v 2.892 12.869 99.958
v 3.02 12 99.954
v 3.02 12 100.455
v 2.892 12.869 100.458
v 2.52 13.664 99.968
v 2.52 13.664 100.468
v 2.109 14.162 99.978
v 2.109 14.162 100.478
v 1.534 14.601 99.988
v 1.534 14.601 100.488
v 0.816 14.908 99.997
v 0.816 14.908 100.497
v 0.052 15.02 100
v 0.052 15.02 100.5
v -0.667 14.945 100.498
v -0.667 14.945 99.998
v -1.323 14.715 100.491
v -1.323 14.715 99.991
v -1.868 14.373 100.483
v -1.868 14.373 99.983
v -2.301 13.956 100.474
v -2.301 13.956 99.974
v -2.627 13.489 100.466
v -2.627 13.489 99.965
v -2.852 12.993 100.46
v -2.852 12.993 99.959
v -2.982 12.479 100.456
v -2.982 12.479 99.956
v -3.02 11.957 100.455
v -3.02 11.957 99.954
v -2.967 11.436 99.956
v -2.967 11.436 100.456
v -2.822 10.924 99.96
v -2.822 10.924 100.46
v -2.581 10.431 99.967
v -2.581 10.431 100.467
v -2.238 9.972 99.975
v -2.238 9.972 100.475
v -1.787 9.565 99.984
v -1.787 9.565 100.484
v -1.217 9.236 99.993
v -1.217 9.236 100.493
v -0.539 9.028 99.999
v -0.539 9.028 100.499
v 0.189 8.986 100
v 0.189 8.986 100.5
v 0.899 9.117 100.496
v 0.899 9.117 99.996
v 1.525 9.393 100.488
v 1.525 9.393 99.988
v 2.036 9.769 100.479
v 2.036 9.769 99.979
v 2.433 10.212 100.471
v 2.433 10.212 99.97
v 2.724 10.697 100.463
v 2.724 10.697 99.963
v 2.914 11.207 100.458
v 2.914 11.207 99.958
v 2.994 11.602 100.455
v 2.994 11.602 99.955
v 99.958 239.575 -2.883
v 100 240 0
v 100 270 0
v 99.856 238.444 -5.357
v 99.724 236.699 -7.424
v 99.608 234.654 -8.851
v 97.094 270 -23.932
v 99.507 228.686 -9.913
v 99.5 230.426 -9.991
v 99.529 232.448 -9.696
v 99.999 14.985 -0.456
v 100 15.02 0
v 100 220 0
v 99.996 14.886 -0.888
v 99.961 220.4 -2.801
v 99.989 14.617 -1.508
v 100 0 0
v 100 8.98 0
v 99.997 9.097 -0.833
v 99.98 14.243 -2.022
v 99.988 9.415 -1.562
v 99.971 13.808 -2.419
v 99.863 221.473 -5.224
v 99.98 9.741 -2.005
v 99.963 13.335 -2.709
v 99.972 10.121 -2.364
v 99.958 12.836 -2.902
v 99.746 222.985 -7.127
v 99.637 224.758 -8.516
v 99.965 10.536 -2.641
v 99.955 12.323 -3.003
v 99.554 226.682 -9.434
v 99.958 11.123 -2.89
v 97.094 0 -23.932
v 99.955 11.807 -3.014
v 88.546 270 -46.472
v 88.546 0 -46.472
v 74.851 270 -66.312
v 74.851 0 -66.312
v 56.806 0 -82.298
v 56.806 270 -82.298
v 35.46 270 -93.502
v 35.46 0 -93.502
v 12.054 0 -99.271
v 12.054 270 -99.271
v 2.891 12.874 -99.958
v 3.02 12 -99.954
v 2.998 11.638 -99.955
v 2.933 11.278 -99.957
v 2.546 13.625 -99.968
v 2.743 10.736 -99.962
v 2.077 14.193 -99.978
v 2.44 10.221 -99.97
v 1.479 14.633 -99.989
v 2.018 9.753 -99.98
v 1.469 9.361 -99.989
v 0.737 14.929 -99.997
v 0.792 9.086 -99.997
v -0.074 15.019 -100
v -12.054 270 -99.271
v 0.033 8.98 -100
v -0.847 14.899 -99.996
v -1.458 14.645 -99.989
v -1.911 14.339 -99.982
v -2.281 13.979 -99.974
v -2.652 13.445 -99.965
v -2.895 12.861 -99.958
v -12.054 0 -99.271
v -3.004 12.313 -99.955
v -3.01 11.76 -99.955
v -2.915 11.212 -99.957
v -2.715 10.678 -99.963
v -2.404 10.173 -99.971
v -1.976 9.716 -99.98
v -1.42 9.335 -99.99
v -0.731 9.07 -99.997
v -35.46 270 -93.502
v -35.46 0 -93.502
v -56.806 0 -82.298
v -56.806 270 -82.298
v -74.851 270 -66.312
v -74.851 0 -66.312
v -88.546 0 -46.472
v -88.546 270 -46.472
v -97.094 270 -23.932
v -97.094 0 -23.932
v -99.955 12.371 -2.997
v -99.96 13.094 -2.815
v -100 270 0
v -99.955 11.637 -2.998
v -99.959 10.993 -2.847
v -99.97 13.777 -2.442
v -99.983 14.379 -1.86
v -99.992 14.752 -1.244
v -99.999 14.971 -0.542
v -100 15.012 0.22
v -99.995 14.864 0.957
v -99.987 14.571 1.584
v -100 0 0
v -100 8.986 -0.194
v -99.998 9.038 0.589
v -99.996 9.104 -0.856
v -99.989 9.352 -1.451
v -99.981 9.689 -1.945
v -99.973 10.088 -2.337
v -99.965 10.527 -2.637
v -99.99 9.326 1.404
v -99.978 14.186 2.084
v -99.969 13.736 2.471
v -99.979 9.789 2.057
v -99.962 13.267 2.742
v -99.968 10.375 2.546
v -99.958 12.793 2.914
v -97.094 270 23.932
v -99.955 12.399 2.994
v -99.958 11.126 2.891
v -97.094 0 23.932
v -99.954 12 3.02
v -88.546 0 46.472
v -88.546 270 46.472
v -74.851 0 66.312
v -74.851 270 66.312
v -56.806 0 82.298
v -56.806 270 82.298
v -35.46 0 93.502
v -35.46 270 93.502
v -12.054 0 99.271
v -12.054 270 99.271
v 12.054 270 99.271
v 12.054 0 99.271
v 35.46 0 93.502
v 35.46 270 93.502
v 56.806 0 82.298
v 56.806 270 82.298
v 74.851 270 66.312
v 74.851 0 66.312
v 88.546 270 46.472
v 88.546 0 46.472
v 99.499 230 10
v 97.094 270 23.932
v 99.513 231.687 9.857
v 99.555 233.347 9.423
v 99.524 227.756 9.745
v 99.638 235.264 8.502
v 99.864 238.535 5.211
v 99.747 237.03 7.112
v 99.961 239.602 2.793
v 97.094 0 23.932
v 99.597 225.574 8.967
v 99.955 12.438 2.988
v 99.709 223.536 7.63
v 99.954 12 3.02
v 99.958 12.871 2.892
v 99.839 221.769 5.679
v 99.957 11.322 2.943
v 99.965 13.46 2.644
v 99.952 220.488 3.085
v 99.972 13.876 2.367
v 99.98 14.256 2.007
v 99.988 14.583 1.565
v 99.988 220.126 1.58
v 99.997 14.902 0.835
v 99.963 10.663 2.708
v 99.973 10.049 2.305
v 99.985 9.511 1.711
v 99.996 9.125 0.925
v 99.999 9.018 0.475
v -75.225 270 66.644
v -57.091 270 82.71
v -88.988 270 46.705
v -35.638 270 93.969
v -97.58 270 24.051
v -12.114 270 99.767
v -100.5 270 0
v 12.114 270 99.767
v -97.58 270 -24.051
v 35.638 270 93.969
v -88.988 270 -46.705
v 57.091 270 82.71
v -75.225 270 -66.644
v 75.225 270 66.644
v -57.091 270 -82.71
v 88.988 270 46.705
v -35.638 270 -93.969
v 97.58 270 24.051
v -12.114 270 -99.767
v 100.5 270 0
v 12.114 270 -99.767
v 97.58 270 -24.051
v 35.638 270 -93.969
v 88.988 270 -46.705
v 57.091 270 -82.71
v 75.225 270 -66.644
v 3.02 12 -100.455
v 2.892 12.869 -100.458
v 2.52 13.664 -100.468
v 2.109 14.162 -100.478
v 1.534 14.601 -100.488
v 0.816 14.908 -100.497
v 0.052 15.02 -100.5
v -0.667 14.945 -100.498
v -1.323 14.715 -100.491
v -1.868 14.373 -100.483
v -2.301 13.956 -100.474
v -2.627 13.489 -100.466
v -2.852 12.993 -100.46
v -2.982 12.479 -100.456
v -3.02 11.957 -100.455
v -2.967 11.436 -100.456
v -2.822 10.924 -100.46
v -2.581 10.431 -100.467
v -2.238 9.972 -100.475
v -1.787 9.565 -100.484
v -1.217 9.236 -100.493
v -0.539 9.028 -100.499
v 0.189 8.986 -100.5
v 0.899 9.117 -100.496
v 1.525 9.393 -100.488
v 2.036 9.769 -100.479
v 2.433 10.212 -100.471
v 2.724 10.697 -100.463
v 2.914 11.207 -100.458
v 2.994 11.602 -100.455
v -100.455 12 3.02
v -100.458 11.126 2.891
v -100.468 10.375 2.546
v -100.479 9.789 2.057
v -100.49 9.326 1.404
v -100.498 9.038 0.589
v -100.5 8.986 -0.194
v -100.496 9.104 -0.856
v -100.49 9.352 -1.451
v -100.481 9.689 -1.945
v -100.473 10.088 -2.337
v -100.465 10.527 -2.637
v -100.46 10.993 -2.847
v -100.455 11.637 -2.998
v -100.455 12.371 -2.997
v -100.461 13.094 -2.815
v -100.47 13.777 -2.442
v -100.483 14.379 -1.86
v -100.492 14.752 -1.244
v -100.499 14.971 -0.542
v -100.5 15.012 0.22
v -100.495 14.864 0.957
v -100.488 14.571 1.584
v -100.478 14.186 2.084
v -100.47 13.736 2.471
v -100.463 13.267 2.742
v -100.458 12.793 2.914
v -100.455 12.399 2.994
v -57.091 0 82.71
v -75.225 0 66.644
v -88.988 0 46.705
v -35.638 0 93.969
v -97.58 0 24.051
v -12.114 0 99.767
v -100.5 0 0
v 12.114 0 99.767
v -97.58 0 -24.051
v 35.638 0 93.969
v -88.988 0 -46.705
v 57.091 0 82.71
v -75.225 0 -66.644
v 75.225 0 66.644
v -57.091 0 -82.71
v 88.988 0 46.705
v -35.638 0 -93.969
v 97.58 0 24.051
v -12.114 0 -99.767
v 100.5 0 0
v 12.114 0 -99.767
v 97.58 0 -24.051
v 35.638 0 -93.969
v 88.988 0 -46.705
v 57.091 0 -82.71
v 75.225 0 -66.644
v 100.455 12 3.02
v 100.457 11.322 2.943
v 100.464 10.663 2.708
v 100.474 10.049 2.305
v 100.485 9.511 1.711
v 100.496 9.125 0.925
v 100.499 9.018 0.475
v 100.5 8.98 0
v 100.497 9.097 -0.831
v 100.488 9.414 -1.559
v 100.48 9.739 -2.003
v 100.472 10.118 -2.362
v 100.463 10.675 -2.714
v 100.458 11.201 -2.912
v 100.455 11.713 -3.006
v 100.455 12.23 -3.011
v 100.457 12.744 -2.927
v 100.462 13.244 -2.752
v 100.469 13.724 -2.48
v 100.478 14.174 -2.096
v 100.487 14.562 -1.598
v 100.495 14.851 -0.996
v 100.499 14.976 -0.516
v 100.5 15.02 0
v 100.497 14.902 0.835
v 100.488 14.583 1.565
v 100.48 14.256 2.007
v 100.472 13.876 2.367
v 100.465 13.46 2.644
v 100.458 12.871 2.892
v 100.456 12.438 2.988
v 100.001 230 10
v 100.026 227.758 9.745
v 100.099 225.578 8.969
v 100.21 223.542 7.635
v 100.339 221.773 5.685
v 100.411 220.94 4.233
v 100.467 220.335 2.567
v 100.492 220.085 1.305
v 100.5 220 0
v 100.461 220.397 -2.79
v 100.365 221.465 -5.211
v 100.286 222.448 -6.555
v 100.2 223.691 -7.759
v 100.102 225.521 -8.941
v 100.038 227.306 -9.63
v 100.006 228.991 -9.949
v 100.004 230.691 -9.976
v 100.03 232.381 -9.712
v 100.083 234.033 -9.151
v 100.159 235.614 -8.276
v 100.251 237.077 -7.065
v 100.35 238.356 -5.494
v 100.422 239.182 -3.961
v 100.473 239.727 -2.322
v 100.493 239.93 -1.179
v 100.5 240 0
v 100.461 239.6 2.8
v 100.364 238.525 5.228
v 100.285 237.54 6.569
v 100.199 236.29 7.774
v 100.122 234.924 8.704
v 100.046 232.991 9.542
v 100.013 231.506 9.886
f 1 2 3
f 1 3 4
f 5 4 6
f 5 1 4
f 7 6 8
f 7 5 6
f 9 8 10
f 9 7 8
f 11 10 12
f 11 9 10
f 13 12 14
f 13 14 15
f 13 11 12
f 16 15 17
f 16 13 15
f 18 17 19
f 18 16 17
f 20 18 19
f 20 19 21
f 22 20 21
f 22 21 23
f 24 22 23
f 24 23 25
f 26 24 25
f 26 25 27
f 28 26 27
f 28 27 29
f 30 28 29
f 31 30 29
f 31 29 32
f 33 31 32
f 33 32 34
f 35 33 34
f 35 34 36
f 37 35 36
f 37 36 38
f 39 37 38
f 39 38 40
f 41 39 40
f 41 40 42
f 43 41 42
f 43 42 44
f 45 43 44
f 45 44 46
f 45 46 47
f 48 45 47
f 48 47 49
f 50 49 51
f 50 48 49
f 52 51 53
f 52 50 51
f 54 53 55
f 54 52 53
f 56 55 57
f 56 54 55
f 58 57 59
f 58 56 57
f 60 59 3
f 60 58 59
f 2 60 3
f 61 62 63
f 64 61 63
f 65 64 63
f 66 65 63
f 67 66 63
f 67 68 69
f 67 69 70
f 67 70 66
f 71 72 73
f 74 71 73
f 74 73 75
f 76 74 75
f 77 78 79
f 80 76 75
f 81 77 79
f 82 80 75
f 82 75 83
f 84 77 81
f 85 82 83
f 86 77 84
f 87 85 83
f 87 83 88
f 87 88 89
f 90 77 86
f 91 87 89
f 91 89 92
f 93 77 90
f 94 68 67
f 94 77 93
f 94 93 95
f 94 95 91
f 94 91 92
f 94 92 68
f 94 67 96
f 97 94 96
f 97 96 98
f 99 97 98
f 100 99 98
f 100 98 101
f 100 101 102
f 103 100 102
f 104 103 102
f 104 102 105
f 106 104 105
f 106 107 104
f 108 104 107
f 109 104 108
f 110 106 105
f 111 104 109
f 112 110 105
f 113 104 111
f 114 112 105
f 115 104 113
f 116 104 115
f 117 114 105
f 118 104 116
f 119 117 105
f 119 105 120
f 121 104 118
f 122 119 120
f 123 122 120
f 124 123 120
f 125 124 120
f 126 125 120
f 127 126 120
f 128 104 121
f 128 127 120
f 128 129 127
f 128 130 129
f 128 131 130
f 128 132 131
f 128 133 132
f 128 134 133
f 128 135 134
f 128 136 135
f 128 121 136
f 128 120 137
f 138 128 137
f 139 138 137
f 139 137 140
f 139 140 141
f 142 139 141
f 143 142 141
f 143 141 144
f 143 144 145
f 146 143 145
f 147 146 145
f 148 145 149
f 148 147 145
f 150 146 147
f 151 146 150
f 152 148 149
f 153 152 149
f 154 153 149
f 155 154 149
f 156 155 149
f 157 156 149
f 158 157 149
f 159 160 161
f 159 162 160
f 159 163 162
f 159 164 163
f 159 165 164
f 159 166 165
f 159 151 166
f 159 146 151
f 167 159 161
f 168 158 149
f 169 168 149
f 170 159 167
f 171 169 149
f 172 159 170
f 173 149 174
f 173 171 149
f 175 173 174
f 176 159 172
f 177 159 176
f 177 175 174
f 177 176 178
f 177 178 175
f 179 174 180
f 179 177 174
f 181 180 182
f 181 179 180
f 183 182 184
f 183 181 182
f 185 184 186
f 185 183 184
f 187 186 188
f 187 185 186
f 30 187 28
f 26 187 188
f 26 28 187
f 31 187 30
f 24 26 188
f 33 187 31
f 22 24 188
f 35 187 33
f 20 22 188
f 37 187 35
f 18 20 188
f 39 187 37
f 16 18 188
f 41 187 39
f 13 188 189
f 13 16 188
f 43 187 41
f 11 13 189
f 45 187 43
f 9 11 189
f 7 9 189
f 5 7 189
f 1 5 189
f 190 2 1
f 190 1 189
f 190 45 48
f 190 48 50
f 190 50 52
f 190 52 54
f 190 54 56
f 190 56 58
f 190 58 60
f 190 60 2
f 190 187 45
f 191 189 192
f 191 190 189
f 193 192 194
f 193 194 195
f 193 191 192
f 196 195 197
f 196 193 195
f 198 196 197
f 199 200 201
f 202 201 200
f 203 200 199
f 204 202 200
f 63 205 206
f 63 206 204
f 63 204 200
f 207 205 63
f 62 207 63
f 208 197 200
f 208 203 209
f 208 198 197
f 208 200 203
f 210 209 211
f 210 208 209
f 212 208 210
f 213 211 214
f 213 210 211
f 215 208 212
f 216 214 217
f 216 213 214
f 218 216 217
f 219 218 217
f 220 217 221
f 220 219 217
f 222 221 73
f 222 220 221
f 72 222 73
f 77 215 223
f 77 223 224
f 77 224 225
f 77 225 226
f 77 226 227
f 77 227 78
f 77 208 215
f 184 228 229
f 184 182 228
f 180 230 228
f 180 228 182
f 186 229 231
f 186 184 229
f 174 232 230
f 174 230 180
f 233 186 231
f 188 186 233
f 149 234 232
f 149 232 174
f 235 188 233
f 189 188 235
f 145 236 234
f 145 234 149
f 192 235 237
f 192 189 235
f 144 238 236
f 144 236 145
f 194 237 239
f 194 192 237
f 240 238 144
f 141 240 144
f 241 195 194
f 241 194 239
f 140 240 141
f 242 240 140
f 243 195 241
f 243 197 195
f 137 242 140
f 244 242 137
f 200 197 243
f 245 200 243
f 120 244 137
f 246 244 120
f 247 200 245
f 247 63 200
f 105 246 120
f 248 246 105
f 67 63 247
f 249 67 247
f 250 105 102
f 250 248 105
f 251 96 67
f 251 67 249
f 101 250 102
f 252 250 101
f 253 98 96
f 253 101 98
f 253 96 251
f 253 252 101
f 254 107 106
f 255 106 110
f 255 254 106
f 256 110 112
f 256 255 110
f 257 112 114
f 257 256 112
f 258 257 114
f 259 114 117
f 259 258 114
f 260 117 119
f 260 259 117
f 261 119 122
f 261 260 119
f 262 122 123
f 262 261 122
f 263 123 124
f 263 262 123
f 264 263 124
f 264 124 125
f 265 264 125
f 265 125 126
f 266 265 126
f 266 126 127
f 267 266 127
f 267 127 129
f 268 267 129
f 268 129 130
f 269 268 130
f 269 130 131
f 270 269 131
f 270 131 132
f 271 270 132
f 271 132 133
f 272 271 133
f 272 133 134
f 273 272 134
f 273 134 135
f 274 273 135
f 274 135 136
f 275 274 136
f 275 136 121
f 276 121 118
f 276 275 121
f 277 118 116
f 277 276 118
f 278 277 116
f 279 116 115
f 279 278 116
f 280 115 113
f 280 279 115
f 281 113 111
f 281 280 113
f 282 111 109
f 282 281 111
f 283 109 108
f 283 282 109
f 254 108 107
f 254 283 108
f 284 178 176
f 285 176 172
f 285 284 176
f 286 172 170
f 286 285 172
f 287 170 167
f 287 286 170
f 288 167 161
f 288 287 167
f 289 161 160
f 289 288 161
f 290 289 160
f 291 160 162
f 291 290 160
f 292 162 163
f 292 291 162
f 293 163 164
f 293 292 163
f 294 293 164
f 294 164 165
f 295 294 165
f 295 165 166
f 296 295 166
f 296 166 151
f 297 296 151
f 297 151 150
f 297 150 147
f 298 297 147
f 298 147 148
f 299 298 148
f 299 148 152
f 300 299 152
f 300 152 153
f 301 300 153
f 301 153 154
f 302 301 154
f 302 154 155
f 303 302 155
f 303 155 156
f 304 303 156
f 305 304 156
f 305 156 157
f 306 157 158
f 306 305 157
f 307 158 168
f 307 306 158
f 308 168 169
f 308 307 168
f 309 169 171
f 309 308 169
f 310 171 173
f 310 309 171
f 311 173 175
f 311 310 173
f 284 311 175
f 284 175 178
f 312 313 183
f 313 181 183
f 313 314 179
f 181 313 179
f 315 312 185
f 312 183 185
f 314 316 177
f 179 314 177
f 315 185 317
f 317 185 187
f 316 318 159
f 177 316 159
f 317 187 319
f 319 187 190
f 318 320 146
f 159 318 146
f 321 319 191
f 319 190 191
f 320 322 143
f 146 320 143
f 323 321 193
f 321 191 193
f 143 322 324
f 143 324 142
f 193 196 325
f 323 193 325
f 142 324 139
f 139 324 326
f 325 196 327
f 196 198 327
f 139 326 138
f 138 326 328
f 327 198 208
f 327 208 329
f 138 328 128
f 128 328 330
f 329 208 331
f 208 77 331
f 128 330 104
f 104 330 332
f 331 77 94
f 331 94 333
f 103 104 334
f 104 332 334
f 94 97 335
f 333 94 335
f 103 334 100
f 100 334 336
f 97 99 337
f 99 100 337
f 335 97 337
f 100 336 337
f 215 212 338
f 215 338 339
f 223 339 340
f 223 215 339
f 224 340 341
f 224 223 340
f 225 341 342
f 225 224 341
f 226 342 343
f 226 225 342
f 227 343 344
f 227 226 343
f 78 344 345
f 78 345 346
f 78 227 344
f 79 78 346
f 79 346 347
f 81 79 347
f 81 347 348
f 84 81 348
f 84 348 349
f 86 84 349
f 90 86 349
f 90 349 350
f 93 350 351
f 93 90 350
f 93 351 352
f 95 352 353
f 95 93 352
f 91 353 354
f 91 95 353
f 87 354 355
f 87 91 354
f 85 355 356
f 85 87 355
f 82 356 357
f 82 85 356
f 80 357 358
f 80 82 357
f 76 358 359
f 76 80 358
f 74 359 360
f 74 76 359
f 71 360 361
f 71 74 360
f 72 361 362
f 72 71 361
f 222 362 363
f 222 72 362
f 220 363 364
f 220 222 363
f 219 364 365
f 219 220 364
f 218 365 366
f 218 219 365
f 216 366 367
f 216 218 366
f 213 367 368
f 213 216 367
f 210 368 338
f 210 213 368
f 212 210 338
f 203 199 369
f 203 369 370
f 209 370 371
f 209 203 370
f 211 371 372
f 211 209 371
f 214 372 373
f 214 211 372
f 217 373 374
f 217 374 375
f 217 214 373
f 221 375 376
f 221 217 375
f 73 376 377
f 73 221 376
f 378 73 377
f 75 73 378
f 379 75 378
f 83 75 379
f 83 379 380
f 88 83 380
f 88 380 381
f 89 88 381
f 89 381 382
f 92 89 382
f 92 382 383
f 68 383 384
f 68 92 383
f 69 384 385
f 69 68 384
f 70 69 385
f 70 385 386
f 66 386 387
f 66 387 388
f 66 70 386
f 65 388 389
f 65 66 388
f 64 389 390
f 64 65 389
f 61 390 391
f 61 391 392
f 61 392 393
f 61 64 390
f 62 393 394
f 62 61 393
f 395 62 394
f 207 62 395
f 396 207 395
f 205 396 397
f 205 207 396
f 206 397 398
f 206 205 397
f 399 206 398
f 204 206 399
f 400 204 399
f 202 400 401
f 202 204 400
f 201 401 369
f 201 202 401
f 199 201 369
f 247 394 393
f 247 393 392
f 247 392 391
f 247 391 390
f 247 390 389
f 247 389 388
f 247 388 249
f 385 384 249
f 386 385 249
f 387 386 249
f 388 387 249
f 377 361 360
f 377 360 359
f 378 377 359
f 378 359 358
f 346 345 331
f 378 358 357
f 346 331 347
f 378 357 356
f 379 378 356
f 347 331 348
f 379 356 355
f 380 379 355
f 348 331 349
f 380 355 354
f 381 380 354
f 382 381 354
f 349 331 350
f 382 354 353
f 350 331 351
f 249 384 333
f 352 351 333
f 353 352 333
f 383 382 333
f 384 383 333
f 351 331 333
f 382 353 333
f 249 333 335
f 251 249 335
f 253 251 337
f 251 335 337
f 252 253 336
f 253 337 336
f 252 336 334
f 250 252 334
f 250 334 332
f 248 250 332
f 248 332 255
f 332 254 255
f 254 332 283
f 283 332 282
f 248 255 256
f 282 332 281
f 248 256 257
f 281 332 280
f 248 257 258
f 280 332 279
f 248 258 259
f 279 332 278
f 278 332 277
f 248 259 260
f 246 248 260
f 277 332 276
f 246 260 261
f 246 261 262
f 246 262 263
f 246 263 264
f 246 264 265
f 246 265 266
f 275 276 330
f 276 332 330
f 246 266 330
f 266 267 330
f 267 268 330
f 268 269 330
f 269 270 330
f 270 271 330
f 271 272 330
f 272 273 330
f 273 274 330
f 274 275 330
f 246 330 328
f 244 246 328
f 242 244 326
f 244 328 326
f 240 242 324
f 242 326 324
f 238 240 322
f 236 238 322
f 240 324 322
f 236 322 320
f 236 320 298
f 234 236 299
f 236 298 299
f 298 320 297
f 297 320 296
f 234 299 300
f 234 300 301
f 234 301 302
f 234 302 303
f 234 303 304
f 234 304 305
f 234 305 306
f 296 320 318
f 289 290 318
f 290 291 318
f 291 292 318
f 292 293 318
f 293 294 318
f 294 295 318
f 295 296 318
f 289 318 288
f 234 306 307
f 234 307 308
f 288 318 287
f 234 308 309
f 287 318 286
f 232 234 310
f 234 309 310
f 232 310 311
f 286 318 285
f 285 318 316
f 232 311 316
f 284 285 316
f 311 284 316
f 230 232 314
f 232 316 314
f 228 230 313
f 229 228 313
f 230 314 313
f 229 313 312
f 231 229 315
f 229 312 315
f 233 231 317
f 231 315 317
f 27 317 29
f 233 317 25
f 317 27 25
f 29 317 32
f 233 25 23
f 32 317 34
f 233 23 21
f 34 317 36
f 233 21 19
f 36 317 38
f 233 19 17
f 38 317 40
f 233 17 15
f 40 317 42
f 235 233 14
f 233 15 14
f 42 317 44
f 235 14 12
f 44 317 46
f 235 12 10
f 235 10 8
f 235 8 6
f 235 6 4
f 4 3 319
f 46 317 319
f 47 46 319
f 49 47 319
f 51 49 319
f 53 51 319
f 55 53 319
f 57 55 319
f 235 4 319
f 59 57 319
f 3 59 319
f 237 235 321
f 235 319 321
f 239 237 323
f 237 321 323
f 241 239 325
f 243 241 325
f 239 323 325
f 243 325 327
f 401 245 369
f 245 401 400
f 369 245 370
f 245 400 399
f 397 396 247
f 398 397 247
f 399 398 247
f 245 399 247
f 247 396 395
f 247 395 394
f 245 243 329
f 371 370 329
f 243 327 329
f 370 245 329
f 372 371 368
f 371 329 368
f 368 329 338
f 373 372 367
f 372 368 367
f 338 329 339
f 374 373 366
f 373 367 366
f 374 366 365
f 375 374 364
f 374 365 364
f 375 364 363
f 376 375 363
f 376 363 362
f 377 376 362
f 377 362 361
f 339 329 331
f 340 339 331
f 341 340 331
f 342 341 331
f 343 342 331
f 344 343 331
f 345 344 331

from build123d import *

# Parameters (mm, degrees)
SKETCH_1_R               = 100.5
SKETCH_1_R_2             = 100
EXTRUDE_1_DEPTH          = 270
CUT_EXTRUDE_1_DEPTH      = 306.123745389
CUT_EXTRUDE_1_DEPTH_BACK = 306.123745389
SKETCH_3_R               = 3.02
CUT_EXTRUDE_2_REACH      = 307.124
CUT_EXTRUDE_2_END_RADIUS = 100.5
SKETCH_3_3_R             = 10
CUT_EXTRUDE_3_DEPTH      = 306.123745543
CUT_EXTRUDE_3_DEPTH_BACK = 306.123745543
SKETCH_6_R               = 3.02


with BuildPart() as part:
    # 草图1 → 拉伸-薄壁1 (new body)
    with BuildSketch(Plane(origin=(0, 0, 0), x_dir=(1, 0, 0), z_dir=(0, 1, 0))):
        Circle(SKETCH_1_R)
        Circle(SKETCH_1_R_2, mode=Mode.SUBTRACT)
    extrude(amount=EXTRUDE_1_DEPTH)

    # 草图3 → 切除-拉伸1 (cut, two sides: drawn at the far end of the back side and taken through both)
    with BuildSketch(Plane(origin=(0, 0, 0), x_dir=(0, 0, -1), z_dir=(1, 0, 0)).offset(-CUT_EXTRUDE_1_DEPTH_BACK)):
        with Locations(Location((0, 12, 0), (0, 0, 180))):
            Circle(SKETCH_3_R)
    extrude(amount=CUT_EXTRUDE_1_DEPTH + CUT_EXTRUDE_1_DEPTH_BACK, mode=Mode.SUBTRACT)

    # 切除-拉伸2: up to this cylinder (the profile starts inside it)
    cut_extrude_2_end = Plane(origin=(0, 230, 0), z_dir=(0, -1, 0)) * Cylinder(CUT_EXTRUDE_2_END_RADIUS, 816.248, mode=Mode.PRIVATE)
    # 草图3<3> → 切除-拉伸2 (cut, up to the surface)
    with BuildSketch(Plane(origin=(0, 0, 0), x_dir=(0, 0, -1), z_dir=(1, 0, 0)), mode=Mode.PRIVATE) as cut_extrude_2_sk1:
        with Locations(Location((0, 230, 0), (0, 0, 180))):
            Circle(SKETCH_3_3_R)
    cut_extrude_2_tool1 = extrude(cut_extrude_2_sk1.sketch, amount=CUT_EXTRUDE_2_REACH, mode=Mode.PRIVATE) & cut_extrude_2_end
    add(cut_extrude_2_tool1.solids().sort_by_distance((0, 230, 0))[0], mode=Mode.SUBTRACT)

    # 草图6 → 切除-拉伸3 (cut, two sides: drawn at the far end of the back side and taken through both)
    with BuildSketch(Plane.XY.offset(-CUT_EXTRUDE_3_DEPTH_BACK)):
        with Locations((0, 12)):
            Circle(SKETCH_6_R)
    extrude(amount=CUT_EXTRUDE_3_DEPTH + CUT_EXTRUDE_3_DEPTH_BACK, mode=Mode.SUBTRACT)


solid = part.part
